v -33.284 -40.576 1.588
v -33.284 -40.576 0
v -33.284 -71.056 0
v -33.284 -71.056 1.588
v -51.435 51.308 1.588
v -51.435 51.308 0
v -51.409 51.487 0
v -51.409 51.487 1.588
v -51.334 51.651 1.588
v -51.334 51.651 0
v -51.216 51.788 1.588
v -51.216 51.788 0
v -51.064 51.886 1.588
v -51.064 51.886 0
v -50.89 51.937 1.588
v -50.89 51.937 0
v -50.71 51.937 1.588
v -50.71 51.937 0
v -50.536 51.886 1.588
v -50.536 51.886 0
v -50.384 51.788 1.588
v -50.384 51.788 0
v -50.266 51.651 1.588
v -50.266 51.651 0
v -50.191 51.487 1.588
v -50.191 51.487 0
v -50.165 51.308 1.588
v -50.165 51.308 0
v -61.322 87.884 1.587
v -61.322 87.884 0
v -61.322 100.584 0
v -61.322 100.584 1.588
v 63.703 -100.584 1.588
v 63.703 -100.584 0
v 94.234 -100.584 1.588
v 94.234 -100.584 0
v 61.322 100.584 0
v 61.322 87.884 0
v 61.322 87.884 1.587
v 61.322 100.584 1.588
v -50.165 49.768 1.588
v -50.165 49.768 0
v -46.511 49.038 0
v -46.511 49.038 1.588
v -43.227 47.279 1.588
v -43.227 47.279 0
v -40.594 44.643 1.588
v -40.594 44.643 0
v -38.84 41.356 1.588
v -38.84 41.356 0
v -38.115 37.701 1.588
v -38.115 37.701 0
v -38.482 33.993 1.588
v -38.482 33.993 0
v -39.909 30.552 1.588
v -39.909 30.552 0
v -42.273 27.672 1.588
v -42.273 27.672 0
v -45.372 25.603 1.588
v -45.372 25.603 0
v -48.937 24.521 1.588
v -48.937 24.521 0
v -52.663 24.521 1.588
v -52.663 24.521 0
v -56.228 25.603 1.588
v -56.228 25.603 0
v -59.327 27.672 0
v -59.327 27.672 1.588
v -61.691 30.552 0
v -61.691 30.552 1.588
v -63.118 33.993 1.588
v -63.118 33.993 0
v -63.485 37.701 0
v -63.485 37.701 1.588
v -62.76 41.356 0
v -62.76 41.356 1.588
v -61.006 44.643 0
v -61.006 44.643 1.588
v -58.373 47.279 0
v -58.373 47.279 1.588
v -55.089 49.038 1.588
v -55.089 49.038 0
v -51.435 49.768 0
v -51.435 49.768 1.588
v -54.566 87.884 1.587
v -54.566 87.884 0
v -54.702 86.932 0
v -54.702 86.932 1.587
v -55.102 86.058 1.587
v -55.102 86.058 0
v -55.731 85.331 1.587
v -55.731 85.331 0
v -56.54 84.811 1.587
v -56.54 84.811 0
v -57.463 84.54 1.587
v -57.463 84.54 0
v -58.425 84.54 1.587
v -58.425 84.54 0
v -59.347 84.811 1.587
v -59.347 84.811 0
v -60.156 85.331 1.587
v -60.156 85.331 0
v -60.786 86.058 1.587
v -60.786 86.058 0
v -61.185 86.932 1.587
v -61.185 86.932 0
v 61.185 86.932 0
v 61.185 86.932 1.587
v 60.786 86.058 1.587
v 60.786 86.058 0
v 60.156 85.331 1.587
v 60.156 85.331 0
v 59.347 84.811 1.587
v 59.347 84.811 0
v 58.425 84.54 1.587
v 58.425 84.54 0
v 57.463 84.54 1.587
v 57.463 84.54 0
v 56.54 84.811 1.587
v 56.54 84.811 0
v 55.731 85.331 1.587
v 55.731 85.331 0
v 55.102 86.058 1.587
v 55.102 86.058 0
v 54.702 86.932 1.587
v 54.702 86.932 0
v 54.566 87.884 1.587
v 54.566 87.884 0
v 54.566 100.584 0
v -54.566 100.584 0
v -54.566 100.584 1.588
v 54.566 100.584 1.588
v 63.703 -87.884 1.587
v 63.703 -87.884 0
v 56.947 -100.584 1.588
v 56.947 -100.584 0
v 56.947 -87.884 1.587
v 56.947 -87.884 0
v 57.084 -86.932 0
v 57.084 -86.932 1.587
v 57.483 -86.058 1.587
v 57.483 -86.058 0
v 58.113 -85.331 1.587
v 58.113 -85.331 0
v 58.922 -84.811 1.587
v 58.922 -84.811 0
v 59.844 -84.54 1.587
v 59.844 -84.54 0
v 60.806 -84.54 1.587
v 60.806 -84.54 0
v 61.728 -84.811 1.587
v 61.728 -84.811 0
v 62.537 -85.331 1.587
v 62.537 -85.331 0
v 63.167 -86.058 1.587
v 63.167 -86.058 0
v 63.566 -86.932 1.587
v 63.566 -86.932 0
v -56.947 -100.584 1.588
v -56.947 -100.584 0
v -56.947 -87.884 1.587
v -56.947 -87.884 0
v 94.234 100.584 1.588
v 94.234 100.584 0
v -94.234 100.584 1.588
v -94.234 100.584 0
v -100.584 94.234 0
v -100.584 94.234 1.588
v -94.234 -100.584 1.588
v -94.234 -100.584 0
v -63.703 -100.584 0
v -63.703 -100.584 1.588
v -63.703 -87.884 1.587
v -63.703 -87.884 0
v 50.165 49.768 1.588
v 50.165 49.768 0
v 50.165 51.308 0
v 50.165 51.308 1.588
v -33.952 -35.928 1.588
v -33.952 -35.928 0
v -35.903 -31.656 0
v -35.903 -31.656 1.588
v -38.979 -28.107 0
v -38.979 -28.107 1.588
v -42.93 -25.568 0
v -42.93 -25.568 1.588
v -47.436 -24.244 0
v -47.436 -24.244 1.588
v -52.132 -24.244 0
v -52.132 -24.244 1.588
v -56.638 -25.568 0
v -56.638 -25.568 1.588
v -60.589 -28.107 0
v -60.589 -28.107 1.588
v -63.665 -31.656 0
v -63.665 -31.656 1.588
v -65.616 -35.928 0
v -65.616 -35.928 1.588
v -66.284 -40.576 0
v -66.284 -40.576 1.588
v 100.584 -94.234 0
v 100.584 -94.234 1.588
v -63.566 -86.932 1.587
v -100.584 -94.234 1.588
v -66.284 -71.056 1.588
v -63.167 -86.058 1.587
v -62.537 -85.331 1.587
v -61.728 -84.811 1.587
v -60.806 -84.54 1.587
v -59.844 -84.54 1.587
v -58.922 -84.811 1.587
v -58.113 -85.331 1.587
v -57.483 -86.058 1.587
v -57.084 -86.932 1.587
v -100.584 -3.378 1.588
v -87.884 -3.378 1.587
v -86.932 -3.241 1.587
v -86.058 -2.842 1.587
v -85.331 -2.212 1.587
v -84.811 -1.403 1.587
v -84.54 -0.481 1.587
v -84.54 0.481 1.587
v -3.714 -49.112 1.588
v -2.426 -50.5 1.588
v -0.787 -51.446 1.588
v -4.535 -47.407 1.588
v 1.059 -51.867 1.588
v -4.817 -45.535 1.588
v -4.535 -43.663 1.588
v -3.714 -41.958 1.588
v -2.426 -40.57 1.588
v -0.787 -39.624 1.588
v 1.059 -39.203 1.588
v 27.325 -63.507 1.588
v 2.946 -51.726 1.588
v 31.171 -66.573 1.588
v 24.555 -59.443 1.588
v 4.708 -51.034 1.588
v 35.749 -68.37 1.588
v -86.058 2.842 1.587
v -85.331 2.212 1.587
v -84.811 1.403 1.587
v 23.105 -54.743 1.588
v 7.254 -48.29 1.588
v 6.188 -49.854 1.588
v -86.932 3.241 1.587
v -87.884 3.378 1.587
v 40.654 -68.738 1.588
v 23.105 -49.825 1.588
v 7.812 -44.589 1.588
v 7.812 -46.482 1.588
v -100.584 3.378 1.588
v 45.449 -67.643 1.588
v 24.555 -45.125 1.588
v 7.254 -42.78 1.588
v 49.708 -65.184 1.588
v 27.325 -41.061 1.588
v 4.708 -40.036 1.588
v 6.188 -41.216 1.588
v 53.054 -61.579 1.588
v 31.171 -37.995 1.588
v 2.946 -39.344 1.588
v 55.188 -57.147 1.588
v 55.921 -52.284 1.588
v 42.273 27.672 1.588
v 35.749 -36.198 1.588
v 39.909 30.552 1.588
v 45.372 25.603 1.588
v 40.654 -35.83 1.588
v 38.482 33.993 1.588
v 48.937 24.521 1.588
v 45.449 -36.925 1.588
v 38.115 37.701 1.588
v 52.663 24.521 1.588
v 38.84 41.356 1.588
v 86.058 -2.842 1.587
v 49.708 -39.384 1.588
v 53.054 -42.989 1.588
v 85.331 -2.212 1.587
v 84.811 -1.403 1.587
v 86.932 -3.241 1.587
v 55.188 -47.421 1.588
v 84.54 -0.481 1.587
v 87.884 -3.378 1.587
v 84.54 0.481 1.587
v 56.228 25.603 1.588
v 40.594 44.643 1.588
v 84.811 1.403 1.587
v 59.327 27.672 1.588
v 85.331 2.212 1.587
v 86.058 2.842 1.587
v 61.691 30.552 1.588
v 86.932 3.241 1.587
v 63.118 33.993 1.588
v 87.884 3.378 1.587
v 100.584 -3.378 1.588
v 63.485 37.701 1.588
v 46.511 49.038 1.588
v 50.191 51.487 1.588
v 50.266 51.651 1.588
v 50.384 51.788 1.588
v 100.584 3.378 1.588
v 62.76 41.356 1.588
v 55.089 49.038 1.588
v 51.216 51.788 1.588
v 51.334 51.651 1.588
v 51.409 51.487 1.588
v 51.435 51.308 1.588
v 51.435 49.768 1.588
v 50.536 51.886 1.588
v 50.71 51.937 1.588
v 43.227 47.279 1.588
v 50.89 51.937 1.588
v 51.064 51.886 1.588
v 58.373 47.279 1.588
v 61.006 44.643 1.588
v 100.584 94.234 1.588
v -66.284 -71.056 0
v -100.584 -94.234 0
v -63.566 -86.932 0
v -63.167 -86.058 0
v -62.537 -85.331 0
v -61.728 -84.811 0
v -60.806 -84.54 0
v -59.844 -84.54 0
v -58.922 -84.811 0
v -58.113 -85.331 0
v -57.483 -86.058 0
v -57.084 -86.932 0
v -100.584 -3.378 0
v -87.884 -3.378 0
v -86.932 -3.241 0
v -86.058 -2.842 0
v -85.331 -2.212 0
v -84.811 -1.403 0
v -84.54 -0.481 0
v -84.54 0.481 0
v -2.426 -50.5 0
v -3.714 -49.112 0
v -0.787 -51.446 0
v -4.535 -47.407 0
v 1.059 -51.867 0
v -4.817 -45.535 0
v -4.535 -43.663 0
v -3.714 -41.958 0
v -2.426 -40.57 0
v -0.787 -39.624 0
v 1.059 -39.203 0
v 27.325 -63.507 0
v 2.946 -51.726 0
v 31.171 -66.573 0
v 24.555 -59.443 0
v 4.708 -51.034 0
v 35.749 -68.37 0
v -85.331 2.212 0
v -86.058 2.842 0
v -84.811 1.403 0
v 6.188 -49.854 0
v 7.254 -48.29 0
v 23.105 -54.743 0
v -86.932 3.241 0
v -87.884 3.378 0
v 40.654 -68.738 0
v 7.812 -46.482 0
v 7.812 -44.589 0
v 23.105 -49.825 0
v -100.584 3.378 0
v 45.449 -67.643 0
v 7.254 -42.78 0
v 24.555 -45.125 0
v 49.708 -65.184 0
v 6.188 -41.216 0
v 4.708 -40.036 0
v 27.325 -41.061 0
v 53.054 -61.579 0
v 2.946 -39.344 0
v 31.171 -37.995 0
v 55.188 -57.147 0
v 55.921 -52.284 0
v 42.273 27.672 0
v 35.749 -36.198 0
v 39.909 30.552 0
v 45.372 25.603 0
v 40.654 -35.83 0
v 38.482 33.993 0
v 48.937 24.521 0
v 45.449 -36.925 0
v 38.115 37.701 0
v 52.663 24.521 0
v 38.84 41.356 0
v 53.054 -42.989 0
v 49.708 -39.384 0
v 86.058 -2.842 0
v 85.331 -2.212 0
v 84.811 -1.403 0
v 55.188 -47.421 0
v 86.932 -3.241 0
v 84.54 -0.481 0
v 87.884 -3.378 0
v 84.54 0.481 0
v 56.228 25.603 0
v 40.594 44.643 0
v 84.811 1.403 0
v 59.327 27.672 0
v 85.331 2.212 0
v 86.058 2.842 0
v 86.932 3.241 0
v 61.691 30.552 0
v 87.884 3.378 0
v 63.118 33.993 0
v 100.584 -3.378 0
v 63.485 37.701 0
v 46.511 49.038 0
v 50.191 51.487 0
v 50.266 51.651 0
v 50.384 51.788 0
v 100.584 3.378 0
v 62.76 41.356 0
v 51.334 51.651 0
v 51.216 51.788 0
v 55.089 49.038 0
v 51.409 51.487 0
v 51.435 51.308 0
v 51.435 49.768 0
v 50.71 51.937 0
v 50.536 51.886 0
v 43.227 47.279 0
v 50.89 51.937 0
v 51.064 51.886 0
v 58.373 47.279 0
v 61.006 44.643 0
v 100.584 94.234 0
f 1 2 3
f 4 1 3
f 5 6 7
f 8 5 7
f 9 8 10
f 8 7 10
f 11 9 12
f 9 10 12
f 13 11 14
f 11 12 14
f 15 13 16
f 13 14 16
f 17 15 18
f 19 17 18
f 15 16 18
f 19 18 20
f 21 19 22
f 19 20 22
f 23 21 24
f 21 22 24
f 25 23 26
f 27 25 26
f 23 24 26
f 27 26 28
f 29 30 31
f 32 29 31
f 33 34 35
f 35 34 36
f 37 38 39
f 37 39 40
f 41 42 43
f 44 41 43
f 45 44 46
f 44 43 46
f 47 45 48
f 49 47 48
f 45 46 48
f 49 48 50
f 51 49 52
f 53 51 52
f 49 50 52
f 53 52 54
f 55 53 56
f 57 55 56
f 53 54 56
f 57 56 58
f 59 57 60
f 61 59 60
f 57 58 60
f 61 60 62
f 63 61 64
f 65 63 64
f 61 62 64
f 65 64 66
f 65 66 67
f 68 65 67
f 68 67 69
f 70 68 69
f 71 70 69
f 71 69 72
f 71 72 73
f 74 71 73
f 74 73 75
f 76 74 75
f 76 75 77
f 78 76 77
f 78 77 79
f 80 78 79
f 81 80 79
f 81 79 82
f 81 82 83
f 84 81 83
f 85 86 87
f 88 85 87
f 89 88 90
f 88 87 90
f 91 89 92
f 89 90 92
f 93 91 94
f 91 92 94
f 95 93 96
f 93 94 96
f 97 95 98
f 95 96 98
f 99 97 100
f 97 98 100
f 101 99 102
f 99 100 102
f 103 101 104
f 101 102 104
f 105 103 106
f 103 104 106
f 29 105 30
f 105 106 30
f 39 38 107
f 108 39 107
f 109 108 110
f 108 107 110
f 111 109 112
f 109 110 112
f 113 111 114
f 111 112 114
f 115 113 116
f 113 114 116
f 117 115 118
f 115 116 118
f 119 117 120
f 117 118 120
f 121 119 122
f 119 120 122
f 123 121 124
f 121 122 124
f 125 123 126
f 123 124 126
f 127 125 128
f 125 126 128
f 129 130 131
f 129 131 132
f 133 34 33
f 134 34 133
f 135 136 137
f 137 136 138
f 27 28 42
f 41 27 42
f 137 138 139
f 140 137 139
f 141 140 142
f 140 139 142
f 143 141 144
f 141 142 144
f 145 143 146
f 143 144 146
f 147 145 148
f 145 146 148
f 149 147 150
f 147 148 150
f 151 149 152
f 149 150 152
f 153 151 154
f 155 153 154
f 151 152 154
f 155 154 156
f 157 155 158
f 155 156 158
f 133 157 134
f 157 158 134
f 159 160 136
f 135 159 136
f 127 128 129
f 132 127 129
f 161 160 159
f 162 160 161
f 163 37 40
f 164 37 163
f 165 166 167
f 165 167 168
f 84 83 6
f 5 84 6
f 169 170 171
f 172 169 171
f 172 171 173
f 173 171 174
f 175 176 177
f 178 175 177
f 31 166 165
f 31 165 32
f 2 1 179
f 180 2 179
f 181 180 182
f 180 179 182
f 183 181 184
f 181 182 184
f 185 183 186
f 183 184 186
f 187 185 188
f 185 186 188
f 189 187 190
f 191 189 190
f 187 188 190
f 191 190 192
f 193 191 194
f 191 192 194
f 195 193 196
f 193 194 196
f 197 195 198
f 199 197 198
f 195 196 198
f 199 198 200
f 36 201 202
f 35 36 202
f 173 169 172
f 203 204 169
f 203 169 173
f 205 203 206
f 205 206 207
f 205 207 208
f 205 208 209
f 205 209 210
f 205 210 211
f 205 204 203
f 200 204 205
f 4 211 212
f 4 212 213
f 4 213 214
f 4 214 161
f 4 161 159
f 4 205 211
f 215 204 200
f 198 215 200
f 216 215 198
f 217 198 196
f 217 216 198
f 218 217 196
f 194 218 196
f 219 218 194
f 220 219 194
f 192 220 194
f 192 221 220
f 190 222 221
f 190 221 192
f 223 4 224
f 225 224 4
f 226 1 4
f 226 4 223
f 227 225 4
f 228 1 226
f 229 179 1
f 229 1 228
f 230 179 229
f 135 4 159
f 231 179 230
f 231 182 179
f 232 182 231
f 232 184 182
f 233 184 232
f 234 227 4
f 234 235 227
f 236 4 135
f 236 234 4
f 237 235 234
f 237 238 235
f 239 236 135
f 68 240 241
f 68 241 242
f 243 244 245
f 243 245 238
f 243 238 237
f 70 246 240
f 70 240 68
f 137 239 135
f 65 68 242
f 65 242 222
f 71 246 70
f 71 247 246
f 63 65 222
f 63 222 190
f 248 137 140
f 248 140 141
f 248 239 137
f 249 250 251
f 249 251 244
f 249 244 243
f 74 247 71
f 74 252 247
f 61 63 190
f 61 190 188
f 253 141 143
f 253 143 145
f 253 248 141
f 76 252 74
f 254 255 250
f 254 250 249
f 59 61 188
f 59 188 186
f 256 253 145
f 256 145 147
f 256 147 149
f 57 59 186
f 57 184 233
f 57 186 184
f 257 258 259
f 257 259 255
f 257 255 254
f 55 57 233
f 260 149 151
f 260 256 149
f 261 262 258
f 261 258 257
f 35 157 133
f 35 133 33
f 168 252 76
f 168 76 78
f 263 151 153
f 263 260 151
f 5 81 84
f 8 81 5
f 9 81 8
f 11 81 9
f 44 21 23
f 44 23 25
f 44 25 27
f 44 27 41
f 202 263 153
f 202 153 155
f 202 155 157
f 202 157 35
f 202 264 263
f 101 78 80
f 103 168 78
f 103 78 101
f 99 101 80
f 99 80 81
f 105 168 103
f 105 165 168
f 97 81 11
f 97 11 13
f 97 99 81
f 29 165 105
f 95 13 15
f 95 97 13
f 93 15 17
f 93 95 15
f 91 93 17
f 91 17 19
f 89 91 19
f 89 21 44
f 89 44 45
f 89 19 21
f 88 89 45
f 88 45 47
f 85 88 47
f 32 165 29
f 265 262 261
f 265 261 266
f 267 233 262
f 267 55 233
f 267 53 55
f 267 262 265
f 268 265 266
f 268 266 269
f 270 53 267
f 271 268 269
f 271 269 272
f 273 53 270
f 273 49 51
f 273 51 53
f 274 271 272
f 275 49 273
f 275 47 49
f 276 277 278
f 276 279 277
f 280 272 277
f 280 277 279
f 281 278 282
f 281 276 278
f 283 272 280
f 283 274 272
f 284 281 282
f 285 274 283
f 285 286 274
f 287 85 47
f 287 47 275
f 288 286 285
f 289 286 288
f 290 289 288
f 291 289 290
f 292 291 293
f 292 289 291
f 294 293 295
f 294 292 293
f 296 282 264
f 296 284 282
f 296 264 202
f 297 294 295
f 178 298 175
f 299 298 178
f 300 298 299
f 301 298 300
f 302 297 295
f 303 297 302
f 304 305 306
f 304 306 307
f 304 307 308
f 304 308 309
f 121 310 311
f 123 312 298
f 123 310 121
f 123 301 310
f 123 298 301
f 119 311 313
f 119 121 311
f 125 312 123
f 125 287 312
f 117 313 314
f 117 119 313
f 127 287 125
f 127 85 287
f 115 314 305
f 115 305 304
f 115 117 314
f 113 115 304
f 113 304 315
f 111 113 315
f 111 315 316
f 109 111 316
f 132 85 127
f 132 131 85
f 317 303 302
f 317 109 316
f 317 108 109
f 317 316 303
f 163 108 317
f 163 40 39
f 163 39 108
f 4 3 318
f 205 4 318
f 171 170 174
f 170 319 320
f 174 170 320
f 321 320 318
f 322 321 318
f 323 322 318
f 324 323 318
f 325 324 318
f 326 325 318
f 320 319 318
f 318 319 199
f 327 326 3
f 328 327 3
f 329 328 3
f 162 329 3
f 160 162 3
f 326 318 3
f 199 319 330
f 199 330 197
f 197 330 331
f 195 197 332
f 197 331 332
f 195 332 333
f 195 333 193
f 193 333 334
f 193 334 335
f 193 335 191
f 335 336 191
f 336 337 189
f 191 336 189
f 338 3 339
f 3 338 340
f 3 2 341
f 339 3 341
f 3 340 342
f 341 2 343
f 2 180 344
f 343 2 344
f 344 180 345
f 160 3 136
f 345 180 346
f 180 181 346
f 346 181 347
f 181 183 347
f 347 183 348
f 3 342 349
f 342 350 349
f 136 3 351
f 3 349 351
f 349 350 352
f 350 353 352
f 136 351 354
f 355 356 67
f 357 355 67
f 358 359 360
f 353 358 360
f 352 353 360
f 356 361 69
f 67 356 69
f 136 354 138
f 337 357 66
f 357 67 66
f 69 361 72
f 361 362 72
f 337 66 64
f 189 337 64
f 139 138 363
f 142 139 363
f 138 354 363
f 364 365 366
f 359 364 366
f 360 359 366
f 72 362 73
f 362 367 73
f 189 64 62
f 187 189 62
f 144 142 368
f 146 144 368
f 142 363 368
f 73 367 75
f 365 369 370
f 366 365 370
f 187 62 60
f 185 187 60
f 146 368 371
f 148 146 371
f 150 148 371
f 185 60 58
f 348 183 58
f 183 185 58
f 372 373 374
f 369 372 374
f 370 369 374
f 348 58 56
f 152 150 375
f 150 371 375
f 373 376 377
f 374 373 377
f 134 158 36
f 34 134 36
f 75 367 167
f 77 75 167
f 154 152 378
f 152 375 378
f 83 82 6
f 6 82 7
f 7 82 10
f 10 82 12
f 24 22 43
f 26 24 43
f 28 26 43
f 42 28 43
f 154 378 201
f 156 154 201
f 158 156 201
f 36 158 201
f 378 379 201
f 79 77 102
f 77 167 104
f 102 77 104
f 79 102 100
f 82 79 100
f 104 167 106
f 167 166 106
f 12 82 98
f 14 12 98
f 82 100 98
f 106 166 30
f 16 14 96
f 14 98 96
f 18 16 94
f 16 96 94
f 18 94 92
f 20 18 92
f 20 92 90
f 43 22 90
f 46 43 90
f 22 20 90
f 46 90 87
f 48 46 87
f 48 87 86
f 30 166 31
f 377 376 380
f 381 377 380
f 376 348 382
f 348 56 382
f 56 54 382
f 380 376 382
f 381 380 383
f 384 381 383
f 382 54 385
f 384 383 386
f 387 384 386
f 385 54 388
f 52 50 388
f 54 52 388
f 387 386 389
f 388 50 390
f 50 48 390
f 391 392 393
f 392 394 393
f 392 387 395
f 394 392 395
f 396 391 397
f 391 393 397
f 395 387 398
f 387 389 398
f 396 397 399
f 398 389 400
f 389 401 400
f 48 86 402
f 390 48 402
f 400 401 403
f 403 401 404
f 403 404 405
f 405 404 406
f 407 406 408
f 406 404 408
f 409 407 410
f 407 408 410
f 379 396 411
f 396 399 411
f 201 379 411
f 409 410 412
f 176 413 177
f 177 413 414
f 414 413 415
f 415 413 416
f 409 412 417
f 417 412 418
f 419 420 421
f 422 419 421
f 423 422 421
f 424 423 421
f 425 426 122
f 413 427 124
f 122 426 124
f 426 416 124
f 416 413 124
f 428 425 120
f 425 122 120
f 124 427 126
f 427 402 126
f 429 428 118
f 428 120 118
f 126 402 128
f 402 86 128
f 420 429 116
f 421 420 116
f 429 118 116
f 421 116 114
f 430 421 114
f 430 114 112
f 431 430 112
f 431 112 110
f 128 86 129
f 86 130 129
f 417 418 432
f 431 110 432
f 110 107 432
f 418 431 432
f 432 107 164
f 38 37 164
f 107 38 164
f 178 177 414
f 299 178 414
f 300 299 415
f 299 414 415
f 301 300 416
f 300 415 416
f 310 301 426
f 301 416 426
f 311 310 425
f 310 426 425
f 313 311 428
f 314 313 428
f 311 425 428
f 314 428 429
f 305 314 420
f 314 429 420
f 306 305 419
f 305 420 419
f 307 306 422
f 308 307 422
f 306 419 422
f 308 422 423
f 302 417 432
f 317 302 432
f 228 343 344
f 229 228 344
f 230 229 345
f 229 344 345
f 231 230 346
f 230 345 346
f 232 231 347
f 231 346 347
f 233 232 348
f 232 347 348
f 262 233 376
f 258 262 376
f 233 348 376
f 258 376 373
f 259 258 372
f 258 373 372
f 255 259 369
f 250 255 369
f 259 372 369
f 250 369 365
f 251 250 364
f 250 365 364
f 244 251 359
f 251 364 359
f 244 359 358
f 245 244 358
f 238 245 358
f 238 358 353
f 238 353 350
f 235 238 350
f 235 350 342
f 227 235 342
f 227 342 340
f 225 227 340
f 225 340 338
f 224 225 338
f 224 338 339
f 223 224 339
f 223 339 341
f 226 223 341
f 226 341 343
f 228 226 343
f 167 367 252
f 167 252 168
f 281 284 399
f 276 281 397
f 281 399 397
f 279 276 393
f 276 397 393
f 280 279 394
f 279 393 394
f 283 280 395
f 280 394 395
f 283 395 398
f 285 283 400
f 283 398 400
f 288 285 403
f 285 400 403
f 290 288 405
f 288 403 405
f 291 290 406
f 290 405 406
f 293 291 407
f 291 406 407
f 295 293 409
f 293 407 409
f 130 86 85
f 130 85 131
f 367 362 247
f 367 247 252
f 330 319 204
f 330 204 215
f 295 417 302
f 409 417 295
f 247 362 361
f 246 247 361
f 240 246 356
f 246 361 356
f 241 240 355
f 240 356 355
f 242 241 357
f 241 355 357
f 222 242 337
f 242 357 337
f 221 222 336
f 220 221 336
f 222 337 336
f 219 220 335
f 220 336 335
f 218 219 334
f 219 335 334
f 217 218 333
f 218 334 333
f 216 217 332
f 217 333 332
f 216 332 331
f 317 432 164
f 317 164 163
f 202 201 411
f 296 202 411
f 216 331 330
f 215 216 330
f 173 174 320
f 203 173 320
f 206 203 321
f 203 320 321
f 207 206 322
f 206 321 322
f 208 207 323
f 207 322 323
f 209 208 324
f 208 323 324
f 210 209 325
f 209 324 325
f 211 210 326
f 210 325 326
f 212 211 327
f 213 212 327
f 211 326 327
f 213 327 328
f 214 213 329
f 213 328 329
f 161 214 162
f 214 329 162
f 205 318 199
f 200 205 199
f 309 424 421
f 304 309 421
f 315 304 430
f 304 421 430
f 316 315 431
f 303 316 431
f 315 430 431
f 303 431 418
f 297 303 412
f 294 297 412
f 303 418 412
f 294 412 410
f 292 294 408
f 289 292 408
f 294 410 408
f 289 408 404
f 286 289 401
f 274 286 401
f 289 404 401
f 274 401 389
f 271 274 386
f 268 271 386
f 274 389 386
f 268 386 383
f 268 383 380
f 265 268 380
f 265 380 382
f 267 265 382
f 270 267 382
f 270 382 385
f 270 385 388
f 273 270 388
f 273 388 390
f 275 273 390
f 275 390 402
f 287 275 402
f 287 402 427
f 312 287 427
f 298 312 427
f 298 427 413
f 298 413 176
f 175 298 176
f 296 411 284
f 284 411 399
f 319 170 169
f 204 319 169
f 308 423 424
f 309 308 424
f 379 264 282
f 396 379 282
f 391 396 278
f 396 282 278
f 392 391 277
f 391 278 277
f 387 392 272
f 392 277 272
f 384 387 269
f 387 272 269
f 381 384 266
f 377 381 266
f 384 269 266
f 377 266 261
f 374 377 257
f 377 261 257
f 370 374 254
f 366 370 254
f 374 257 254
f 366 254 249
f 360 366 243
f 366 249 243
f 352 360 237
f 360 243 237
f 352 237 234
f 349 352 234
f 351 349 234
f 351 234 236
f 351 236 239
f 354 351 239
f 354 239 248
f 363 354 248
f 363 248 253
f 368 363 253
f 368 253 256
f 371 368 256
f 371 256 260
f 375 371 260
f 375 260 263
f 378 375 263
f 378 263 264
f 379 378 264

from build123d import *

# Parameters (mm, degrees)
SKETCH1_W                 = 201.168
SKETCH1_H                 = 201.168
BOSS_EXTRUDE1_DEPTH       = 1.5875
CUT_EXTRUDE1_REACH        = 144.256
SKETCH2_R                 = 16.5
F_1_4_CLEARANCE_HOLE1_D   = 6.7564
CHAMFER1_SIZE             = 6.35
CUT_EXTRUDE3_REACH        = 144.256
CUT_EXTRUDE4_REACH        = 144.256
CUT_EXTRUDE5_REACH        = 144.256
SKETCH7_W                 = 6.7564
SKETCH7_H                 = 14.478
SKETCH7_W_2               = 14.478
SKETCH7_H_2               = 6.7564
PORT_FOR_POWER_PLUG_REACH = 144.256
SKETCH8_R                 = 6.35


with BuildPart() as part:
    # Sketch1 → Boss-Extrude1 (new body)
    with BuildSketch(Plane.XY):
        Rectangle(SKETCH1_W, SKETCH1_H)
    extrude(amount=BOSS_EXTRUDE1_DEPTH)

    # Sketch2 → Cut-Extrude1 (cut, up to next)
    with BuildSketch(Plane.XY.offset(1.5875), mode=Mode.PRIVATE) as cut_extrude1_sk1:
        with Locations((-49.784, -40.5765)):
            Circle(SKETCH2_R)
    cut_extrude1_tool1 = extrude(cut_extrude1_sk1.sketch, amount=-CUT_EXTRUDE1_REACH, mode=Mode.PRIVATE) & part.part
    # Sketch2 → Cut-Extrude1 (cut, up to next)
    with BuildSketch(Plane.XY.offset(1.5875), mode=Mode.PRIVATE) as cut_extrude1_sk2:
        with Locations((39.4206, -52.284)):
            Circle(SKETCH2_R)
    cut_extrude1_tool2 = extrude(cut_extrude1_sk2.sketch, amount=-CUT_EXTRUDE1_REACH, mode=Mode.PRIVATE) & part.part
    add(cut_extrude1_tool1.solids().sort_by_distance((-49.784, -40.5765, 1.5875))[0], mode=Mode.SUBTRACT)
    add(cut_extrude1_tool2.solids().sort_by_distance((39.4206, -52.284, 1.5875))[0], mode=Mode.SUBTRACT)

    # 1/4 Clearance Hole1 (through all)
    with Locations(Plane.XY.offset(1.5875)):
        with Locations((-57.94375, 87.884), (57.94375, 87.884), (87.884, 0), (-87.884, 0), (-60.325, -87.884), (60.325, -87.884)):
            Hole(F_1_4_CLEARANCE_HOLE1_D / 2)

    # Chamfer1
    chamfer1_edges = [part.edges().sort_by_distance(p)[0] for p in [
        (100.584, -100.584, 0.79375),
        (-100.584, -100.584, 0.79375),
        (-100.584, 100.584, 0.79375),
        (100.584, 100.584, 0.79375),
    ]]
    chamfer(chamfer1_edges, length=CHAMFER1_SIZE)

    # Sketch5 → Cut-Extrude3 (cut, up to next)
    with BuildSketch(Plane(origin=(0, 0, 0), x_dir=(-1, 0, 0), z_dir=(0, 0, -1)), mode=Mode.PRIVATE) as cut_extrude3_sk1:
        with BuildLine():
            Line((33.284, -40.5765), (33.284, -71.0565))
            Line((33.284, -71.0565), (66.284, -71.0565))
            Line((66.284, -71.0565), (66.284, -40.5765))
            ThreePointArc((66.284, -40.5765), (49.784, -57.0765), (33.284, -40.5765))
        make_face()
    cut_extrude3_tool1 = extrude(cut_extrude3_sk1.sketch, amount=-CUT_EXTRUDE3_REACH, mode=Mode.PRIVATE) & part.part
    add(cut_extrude3_tool1.solids().sort_by_distance((-49.784, -61.908997, 0))[0], mode=Mode.SUBTRACT)

    # Sketch6 → Cut-Extrude4 (cut, up to next)
    with BuildSketch(Plane(origin=(0, 0, 0), x_dir=(-1, 0, 0), z_dir=(0, 0, -1)), mode=Mode.PRIVATE) as cut_extrude4_sk1:
        with BuildLine():
            Line((-50.165, 49.768115066), (-50.165, 51.308))
            ThreePointArc((-50.165, 51.308), (-50.8, 51.943), (-51.435, 51.308))
            Line((-51.435, 51.308), (-51.435, 49.768115066))
            ThreePointArc((-51.435, 49.768115066), (-50.8, 24.384), (-50.165, 49.768115066))
        make_face()
    cut_extrude4_tool1 = extrude(cut_extrude4_sk1.sketch, amount=-CUT_EXTRUDE4_REACH, mode=Mode.PRIVATE) & part.part
    # Sketch6 → Cut-Extrude4 (cut, up to next)
    with BuildSketch(Plane(origin=(0, 0, 0), x_dir=(-1, 0, 0), z_dir=(0, 0, -1)), mode=Mode.PRIVATE) as cut_extrude4_sk2:
        with BuildLine():
            Line((51.435, 49.768115066), (51.435, 51.308))
            ThreePointArc((51.435, 51.308), (50.8, 51.943), (50.165, 51.308))
            Line((50.165, 51.308), (50.165, 49.768115066))
            ThreePointArc((50.165, 49.768115066), (50.8, 24.384), (51.435, 49.768115066))
        make_face()
    cut_extrude4_tool2 = extrude(cut_extrude4_sk2.sketch, amount=-CUT_EXTRUDE4_REACH, mode=Mode.PRIVATE) & part.part
    add(cut_extrude4_tool1.solids().sort_by_distance((50.8, 37.153354, 0))[0], mode=Mode.SUBTRACT)
    add(cut_extrude4_tool2.solids().sort_by_distance((-50.8, 37.153354, 0))[0], mode=Mode.SUBTRACT)

    # Sketch7 → Cut-Extrude5 (cut, up to next)
    with BuildSketch(Plane(origin=(0, 0, 0), x_dir=(-1, 0, 0), z_dir=(0, 0, -1)), mode=Mode.PRIVATE) as cut_extrude5_sk1:
        with Locations((-57.94375, 95.123)):
            Rectangle(SKETCH7_W, SKETCH7_H)
    cut_extrude5_tool1 = extrude(cut_extrude5_sk1.sketch, amount=-CUT_EXTRUDE5_REACH, mode=Mode.PRIVATE) & part.part
    # Sketch7 → Cut-Extrude5 (cut, up to next)
    with BuildSketch(Plane(origin=(0, 0, 0), x_dir=(-1, 0, 0), z_dir=(0, 0, -1)), mode=Mode.PRIVATE) as cut_extrude5_sk2:
        with Locations((57.94375, 95.123)):
            Rectangle(SKETCH7_W, SKETCH7_H)
    cut_extrude5_tool2 = extrude(cut_extrude5_sk2.sketch, amount=-CUT_EXTRUDE5_REACH, mode=Mode.PRIVATE) & part.part
    # Sketch7 → Cut-Extrude5 (cut, up to next)
    with BuildSketch(Plane(origin=(0, 0, 0), x_dir=(-1, 0, 0), z_dir=(0, 0, -1)), mode=Mode.PRIVATE) as cut_extrude5_sk3:
        with Locations((95.123, 0)):
            Rectangle(SKETCH7_W_2, SKETCH7_H_2)
    cut_extrude5_tool3 = extrude(cut_extrude5_sk3.sketch, amount=-CUT_EXTRUDE5_REACH, mode=Mode.PRIVATE) & part.part
    # Sketch7 → Cut-Extrude5 (cut, up to next)
    with BuildSketch(Plane(origin=(0, 0, 0), x_dir=(-1, 0, 0), z_dir=(0, 0, -1)), mode=Mode.PRIVATE) as cut_extrude5_sk4:
        with Locations((60.325, -95.123)):
            Rectangle(SKETCH7_W, SKETCH7_H)
    cut_extrude5_tool4 = extrude(cut_extrude5_sk4.sketch, amount=-CUT_EXTRUDE5_REACH, mode=Mode.PRIVATE) & part.part
    # Sketch7 → Cut-Extrude5 (cut, up to next)
    with BuildSketch(Plane(origin=(0, 0, 0), x_dir=(-1, 0, 0), z_dir=(0, 0, -1)), mode=Mode.PRIVATE) as cut_extrude5_sk5:
        with Locations((-60.325, -95.123)):
            Rectangle(SKETCH7_W, SKETCH7_H)
    cut_extrude5_tool5 = extrude(cut_extrude5_sk5.sketch, amount=-CUT_EXTRUDE5_REACH, mode=Mode.PRIVATE) & part.part
    # Sketch7 → Cut-Extrude5 (cut, up to next)
    with BuildSketch(Plane(origin=(0, 0, 0), x_dir=(-1, 0, 0), z_dir=(0, 0, -1)), mode=Mode.PRIVATE) as cut_extrude5_sk6:
        with Locations((-95.123, 0)):
            Rectangle(SKETCH7_W_2, SKETCH7_H_2)
    cut_extrude5_tool6 = extrude(cut_extrude5_sk6.sketch, amount=-CUT_EXTRUDE5_REACH, mode=Mode.PRIVATE) & part.part
    add(cut_extrude5_tool1.solids().sort_by_distance((57.94375, 95.123, 0))[0], mode=Mode.SUBTRACT)
    add(cut_extrude5_tool2.solids().sort_by_distance((-57.94375, 95.123, 0))[0], mode=Mode.SUBTRACT)
    add(cut_extrude5_tool3.solids().sort_by_distance((-95.123, 0, 0))[0], mode=Mode.SUBTRACT)
    add(cut_extrude5_tool4.solids().sort_by_distance((-60.325, -95.123, 0))[0], mode=Mode.SUBTRACT)
    add(cut_extrude5_tool5.solids().sort_by_distance((60.325, -95.123, 0))[0], mode=Mode.SUBTRACT)
    add(cut_extrude5_tool6.solids().sort_by_distance((95.123, 0, 0))[0], mode=Mode.SUBTRACT)

    # Sketch8 → PORT FOR POWER PLUG (cut, up to next)
    with BuildSketch(Plane(origin=(0, 0, 0), x_dir=(-1, 0, 0), z_dir=(0, 0, -1)), mode=Mode.PRIVATE) as port_for_power_plug_sk1:
        with Locations((-1.533105196, -45.535092969)):
            Circle(SKETCH8_R)
    port_for_power_plug_tool1 = extrude(port_for_power_plug_sk1.sketch, amount=-PORT_FOR_POWER_PLUG_REACH, mode=Mode.PRIVATE) & part.part
    add(port_for_power_plug_tool1.solids().sort_by_distance((1.533105, -45.535093, 0))[0], mode=Mode.SUBTRACT)


solid = part.part
